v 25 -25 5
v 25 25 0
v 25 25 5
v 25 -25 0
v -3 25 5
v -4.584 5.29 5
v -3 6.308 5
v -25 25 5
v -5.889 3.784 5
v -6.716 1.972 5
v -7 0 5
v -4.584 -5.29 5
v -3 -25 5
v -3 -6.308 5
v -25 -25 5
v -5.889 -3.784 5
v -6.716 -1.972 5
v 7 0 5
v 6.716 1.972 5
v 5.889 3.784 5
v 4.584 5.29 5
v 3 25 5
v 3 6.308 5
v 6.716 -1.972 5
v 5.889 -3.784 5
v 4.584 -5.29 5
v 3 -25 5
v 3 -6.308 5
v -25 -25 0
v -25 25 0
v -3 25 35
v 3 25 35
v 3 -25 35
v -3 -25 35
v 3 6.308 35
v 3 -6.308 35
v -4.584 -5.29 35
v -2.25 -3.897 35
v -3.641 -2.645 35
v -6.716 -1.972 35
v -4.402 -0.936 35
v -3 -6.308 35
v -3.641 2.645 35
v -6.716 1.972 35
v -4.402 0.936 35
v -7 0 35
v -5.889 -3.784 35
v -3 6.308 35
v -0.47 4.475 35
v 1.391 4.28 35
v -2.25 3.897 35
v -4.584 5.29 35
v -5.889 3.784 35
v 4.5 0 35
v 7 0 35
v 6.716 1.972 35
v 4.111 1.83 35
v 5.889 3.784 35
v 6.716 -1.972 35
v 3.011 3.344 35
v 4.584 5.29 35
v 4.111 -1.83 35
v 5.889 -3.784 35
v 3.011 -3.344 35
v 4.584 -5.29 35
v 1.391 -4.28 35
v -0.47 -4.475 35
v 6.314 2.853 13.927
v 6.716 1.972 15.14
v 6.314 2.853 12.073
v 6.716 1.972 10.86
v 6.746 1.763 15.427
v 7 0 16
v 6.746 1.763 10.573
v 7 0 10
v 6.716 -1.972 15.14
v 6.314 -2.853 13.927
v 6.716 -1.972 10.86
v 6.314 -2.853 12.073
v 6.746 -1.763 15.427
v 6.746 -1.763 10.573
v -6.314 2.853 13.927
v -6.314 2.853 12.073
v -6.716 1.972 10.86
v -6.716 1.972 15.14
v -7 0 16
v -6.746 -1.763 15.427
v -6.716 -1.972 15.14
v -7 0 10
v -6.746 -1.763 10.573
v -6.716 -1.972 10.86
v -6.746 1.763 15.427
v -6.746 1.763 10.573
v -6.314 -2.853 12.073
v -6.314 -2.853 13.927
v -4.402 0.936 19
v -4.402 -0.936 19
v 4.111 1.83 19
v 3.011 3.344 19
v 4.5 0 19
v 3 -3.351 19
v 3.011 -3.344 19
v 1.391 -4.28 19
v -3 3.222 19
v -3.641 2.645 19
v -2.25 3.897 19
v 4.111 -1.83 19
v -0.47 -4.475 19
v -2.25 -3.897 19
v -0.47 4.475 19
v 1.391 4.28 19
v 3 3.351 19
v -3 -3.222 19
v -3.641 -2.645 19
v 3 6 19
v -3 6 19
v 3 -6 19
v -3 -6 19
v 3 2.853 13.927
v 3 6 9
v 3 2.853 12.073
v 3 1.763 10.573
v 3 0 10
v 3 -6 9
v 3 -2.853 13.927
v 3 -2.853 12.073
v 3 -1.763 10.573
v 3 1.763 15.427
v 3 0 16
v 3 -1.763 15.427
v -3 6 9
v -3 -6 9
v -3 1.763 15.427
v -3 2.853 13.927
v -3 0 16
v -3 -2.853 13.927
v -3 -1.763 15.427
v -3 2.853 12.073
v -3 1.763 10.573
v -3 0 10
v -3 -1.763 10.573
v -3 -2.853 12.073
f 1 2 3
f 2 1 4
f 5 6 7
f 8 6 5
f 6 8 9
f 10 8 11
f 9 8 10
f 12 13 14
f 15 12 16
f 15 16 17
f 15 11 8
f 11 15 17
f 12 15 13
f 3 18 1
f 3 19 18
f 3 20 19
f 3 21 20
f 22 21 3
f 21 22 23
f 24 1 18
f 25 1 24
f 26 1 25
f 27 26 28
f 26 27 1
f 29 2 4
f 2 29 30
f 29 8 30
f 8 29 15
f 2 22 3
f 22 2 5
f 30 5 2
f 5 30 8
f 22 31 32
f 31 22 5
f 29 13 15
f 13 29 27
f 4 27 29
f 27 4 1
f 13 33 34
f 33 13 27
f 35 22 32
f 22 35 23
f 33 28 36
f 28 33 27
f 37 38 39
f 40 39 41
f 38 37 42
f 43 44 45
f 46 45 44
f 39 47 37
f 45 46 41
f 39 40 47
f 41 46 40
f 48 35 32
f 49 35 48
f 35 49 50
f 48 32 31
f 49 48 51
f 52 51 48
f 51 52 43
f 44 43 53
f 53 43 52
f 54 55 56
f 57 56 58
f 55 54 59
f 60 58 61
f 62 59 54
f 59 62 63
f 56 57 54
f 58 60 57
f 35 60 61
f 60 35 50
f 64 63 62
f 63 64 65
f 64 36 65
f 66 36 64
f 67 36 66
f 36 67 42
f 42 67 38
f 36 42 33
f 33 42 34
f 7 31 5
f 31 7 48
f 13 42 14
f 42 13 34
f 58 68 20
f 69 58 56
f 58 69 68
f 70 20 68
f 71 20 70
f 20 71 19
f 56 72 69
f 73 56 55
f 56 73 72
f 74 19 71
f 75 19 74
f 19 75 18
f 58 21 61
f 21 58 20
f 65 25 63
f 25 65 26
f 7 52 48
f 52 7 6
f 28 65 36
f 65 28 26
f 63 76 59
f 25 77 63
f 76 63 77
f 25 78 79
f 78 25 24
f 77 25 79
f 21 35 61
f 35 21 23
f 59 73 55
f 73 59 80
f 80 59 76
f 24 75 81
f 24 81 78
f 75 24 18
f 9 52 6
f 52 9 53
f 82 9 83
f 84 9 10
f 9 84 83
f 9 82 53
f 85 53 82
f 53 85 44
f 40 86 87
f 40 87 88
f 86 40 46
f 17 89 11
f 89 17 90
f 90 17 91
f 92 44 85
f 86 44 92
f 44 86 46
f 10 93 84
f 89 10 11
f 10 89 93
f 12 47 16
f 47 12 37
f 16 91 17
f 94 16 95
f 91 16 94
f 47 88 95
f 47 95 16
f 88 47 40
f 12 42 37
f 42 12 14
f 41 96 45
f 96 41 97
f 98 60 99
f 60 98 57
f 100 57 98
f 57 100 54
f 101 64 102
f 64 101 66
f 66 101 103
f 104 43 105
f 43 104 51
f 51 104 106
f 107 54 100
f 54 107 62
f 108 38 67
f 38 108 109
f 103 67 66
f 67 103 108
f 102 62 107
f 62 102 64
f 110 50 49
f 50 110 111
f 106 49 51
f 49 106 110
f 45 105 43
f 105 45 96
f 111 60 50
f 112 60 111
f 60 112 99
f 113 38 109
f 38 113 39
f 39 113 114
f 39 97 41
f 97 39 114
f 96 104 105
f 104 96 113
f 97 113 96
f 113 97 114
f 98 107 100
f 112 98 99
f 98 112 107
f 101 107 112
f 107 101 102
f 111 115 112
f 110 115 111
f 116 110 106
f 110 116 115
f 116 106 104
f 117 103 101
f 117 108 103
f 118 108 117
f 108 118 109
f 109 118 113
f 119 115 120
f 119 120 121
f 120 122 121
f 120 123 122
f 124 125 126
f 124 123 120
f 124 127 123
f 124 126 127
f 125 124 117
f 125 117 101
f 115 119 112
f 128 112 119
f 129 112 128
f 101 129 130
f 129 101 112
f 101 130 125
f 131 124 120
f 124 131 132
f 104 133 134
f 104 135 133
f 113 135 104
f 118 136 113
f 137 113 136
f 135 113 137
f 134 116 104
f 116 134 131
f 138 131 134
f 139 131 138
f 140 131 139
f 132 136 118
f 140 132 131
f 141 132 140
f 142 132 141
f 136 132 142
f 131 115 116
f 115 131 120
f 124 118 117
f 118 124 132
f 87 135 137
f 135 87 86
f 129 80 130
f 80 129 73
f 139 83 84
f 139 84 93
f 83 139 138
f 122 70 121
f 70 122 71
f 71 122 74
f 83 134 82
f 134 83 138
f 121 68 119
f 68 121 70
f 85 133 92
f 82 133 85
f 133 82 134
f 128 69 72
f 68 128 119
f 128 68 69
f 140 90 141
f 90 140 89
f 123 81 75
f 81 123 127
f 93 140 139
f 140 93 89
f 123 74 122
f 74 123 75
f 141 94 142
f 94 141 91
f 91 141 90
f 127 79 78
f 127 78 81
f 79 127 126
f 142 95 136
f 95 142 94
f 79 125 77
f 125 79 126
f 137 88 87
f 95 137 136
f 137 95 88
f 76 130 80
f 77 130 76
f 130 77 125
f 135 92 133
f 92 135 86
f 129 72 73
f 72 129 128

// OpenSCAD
difference(){
    
union(){
translate([0,0,5/2])
cube ([50,50,5],true);

translate([0,0,35/2])
cube ([6,50,35],true);

translate([0,0,35/2])
cylinder(35,7,7,true);
}

translate([0,0,19])
#cylinder(20,4.5,4.5,false);

translate([0,0,14])
#cube([6,12,10],true);

translate([0,0,13])
rotate([0,90,0])
#cylinder(35,3,3,true);
}
